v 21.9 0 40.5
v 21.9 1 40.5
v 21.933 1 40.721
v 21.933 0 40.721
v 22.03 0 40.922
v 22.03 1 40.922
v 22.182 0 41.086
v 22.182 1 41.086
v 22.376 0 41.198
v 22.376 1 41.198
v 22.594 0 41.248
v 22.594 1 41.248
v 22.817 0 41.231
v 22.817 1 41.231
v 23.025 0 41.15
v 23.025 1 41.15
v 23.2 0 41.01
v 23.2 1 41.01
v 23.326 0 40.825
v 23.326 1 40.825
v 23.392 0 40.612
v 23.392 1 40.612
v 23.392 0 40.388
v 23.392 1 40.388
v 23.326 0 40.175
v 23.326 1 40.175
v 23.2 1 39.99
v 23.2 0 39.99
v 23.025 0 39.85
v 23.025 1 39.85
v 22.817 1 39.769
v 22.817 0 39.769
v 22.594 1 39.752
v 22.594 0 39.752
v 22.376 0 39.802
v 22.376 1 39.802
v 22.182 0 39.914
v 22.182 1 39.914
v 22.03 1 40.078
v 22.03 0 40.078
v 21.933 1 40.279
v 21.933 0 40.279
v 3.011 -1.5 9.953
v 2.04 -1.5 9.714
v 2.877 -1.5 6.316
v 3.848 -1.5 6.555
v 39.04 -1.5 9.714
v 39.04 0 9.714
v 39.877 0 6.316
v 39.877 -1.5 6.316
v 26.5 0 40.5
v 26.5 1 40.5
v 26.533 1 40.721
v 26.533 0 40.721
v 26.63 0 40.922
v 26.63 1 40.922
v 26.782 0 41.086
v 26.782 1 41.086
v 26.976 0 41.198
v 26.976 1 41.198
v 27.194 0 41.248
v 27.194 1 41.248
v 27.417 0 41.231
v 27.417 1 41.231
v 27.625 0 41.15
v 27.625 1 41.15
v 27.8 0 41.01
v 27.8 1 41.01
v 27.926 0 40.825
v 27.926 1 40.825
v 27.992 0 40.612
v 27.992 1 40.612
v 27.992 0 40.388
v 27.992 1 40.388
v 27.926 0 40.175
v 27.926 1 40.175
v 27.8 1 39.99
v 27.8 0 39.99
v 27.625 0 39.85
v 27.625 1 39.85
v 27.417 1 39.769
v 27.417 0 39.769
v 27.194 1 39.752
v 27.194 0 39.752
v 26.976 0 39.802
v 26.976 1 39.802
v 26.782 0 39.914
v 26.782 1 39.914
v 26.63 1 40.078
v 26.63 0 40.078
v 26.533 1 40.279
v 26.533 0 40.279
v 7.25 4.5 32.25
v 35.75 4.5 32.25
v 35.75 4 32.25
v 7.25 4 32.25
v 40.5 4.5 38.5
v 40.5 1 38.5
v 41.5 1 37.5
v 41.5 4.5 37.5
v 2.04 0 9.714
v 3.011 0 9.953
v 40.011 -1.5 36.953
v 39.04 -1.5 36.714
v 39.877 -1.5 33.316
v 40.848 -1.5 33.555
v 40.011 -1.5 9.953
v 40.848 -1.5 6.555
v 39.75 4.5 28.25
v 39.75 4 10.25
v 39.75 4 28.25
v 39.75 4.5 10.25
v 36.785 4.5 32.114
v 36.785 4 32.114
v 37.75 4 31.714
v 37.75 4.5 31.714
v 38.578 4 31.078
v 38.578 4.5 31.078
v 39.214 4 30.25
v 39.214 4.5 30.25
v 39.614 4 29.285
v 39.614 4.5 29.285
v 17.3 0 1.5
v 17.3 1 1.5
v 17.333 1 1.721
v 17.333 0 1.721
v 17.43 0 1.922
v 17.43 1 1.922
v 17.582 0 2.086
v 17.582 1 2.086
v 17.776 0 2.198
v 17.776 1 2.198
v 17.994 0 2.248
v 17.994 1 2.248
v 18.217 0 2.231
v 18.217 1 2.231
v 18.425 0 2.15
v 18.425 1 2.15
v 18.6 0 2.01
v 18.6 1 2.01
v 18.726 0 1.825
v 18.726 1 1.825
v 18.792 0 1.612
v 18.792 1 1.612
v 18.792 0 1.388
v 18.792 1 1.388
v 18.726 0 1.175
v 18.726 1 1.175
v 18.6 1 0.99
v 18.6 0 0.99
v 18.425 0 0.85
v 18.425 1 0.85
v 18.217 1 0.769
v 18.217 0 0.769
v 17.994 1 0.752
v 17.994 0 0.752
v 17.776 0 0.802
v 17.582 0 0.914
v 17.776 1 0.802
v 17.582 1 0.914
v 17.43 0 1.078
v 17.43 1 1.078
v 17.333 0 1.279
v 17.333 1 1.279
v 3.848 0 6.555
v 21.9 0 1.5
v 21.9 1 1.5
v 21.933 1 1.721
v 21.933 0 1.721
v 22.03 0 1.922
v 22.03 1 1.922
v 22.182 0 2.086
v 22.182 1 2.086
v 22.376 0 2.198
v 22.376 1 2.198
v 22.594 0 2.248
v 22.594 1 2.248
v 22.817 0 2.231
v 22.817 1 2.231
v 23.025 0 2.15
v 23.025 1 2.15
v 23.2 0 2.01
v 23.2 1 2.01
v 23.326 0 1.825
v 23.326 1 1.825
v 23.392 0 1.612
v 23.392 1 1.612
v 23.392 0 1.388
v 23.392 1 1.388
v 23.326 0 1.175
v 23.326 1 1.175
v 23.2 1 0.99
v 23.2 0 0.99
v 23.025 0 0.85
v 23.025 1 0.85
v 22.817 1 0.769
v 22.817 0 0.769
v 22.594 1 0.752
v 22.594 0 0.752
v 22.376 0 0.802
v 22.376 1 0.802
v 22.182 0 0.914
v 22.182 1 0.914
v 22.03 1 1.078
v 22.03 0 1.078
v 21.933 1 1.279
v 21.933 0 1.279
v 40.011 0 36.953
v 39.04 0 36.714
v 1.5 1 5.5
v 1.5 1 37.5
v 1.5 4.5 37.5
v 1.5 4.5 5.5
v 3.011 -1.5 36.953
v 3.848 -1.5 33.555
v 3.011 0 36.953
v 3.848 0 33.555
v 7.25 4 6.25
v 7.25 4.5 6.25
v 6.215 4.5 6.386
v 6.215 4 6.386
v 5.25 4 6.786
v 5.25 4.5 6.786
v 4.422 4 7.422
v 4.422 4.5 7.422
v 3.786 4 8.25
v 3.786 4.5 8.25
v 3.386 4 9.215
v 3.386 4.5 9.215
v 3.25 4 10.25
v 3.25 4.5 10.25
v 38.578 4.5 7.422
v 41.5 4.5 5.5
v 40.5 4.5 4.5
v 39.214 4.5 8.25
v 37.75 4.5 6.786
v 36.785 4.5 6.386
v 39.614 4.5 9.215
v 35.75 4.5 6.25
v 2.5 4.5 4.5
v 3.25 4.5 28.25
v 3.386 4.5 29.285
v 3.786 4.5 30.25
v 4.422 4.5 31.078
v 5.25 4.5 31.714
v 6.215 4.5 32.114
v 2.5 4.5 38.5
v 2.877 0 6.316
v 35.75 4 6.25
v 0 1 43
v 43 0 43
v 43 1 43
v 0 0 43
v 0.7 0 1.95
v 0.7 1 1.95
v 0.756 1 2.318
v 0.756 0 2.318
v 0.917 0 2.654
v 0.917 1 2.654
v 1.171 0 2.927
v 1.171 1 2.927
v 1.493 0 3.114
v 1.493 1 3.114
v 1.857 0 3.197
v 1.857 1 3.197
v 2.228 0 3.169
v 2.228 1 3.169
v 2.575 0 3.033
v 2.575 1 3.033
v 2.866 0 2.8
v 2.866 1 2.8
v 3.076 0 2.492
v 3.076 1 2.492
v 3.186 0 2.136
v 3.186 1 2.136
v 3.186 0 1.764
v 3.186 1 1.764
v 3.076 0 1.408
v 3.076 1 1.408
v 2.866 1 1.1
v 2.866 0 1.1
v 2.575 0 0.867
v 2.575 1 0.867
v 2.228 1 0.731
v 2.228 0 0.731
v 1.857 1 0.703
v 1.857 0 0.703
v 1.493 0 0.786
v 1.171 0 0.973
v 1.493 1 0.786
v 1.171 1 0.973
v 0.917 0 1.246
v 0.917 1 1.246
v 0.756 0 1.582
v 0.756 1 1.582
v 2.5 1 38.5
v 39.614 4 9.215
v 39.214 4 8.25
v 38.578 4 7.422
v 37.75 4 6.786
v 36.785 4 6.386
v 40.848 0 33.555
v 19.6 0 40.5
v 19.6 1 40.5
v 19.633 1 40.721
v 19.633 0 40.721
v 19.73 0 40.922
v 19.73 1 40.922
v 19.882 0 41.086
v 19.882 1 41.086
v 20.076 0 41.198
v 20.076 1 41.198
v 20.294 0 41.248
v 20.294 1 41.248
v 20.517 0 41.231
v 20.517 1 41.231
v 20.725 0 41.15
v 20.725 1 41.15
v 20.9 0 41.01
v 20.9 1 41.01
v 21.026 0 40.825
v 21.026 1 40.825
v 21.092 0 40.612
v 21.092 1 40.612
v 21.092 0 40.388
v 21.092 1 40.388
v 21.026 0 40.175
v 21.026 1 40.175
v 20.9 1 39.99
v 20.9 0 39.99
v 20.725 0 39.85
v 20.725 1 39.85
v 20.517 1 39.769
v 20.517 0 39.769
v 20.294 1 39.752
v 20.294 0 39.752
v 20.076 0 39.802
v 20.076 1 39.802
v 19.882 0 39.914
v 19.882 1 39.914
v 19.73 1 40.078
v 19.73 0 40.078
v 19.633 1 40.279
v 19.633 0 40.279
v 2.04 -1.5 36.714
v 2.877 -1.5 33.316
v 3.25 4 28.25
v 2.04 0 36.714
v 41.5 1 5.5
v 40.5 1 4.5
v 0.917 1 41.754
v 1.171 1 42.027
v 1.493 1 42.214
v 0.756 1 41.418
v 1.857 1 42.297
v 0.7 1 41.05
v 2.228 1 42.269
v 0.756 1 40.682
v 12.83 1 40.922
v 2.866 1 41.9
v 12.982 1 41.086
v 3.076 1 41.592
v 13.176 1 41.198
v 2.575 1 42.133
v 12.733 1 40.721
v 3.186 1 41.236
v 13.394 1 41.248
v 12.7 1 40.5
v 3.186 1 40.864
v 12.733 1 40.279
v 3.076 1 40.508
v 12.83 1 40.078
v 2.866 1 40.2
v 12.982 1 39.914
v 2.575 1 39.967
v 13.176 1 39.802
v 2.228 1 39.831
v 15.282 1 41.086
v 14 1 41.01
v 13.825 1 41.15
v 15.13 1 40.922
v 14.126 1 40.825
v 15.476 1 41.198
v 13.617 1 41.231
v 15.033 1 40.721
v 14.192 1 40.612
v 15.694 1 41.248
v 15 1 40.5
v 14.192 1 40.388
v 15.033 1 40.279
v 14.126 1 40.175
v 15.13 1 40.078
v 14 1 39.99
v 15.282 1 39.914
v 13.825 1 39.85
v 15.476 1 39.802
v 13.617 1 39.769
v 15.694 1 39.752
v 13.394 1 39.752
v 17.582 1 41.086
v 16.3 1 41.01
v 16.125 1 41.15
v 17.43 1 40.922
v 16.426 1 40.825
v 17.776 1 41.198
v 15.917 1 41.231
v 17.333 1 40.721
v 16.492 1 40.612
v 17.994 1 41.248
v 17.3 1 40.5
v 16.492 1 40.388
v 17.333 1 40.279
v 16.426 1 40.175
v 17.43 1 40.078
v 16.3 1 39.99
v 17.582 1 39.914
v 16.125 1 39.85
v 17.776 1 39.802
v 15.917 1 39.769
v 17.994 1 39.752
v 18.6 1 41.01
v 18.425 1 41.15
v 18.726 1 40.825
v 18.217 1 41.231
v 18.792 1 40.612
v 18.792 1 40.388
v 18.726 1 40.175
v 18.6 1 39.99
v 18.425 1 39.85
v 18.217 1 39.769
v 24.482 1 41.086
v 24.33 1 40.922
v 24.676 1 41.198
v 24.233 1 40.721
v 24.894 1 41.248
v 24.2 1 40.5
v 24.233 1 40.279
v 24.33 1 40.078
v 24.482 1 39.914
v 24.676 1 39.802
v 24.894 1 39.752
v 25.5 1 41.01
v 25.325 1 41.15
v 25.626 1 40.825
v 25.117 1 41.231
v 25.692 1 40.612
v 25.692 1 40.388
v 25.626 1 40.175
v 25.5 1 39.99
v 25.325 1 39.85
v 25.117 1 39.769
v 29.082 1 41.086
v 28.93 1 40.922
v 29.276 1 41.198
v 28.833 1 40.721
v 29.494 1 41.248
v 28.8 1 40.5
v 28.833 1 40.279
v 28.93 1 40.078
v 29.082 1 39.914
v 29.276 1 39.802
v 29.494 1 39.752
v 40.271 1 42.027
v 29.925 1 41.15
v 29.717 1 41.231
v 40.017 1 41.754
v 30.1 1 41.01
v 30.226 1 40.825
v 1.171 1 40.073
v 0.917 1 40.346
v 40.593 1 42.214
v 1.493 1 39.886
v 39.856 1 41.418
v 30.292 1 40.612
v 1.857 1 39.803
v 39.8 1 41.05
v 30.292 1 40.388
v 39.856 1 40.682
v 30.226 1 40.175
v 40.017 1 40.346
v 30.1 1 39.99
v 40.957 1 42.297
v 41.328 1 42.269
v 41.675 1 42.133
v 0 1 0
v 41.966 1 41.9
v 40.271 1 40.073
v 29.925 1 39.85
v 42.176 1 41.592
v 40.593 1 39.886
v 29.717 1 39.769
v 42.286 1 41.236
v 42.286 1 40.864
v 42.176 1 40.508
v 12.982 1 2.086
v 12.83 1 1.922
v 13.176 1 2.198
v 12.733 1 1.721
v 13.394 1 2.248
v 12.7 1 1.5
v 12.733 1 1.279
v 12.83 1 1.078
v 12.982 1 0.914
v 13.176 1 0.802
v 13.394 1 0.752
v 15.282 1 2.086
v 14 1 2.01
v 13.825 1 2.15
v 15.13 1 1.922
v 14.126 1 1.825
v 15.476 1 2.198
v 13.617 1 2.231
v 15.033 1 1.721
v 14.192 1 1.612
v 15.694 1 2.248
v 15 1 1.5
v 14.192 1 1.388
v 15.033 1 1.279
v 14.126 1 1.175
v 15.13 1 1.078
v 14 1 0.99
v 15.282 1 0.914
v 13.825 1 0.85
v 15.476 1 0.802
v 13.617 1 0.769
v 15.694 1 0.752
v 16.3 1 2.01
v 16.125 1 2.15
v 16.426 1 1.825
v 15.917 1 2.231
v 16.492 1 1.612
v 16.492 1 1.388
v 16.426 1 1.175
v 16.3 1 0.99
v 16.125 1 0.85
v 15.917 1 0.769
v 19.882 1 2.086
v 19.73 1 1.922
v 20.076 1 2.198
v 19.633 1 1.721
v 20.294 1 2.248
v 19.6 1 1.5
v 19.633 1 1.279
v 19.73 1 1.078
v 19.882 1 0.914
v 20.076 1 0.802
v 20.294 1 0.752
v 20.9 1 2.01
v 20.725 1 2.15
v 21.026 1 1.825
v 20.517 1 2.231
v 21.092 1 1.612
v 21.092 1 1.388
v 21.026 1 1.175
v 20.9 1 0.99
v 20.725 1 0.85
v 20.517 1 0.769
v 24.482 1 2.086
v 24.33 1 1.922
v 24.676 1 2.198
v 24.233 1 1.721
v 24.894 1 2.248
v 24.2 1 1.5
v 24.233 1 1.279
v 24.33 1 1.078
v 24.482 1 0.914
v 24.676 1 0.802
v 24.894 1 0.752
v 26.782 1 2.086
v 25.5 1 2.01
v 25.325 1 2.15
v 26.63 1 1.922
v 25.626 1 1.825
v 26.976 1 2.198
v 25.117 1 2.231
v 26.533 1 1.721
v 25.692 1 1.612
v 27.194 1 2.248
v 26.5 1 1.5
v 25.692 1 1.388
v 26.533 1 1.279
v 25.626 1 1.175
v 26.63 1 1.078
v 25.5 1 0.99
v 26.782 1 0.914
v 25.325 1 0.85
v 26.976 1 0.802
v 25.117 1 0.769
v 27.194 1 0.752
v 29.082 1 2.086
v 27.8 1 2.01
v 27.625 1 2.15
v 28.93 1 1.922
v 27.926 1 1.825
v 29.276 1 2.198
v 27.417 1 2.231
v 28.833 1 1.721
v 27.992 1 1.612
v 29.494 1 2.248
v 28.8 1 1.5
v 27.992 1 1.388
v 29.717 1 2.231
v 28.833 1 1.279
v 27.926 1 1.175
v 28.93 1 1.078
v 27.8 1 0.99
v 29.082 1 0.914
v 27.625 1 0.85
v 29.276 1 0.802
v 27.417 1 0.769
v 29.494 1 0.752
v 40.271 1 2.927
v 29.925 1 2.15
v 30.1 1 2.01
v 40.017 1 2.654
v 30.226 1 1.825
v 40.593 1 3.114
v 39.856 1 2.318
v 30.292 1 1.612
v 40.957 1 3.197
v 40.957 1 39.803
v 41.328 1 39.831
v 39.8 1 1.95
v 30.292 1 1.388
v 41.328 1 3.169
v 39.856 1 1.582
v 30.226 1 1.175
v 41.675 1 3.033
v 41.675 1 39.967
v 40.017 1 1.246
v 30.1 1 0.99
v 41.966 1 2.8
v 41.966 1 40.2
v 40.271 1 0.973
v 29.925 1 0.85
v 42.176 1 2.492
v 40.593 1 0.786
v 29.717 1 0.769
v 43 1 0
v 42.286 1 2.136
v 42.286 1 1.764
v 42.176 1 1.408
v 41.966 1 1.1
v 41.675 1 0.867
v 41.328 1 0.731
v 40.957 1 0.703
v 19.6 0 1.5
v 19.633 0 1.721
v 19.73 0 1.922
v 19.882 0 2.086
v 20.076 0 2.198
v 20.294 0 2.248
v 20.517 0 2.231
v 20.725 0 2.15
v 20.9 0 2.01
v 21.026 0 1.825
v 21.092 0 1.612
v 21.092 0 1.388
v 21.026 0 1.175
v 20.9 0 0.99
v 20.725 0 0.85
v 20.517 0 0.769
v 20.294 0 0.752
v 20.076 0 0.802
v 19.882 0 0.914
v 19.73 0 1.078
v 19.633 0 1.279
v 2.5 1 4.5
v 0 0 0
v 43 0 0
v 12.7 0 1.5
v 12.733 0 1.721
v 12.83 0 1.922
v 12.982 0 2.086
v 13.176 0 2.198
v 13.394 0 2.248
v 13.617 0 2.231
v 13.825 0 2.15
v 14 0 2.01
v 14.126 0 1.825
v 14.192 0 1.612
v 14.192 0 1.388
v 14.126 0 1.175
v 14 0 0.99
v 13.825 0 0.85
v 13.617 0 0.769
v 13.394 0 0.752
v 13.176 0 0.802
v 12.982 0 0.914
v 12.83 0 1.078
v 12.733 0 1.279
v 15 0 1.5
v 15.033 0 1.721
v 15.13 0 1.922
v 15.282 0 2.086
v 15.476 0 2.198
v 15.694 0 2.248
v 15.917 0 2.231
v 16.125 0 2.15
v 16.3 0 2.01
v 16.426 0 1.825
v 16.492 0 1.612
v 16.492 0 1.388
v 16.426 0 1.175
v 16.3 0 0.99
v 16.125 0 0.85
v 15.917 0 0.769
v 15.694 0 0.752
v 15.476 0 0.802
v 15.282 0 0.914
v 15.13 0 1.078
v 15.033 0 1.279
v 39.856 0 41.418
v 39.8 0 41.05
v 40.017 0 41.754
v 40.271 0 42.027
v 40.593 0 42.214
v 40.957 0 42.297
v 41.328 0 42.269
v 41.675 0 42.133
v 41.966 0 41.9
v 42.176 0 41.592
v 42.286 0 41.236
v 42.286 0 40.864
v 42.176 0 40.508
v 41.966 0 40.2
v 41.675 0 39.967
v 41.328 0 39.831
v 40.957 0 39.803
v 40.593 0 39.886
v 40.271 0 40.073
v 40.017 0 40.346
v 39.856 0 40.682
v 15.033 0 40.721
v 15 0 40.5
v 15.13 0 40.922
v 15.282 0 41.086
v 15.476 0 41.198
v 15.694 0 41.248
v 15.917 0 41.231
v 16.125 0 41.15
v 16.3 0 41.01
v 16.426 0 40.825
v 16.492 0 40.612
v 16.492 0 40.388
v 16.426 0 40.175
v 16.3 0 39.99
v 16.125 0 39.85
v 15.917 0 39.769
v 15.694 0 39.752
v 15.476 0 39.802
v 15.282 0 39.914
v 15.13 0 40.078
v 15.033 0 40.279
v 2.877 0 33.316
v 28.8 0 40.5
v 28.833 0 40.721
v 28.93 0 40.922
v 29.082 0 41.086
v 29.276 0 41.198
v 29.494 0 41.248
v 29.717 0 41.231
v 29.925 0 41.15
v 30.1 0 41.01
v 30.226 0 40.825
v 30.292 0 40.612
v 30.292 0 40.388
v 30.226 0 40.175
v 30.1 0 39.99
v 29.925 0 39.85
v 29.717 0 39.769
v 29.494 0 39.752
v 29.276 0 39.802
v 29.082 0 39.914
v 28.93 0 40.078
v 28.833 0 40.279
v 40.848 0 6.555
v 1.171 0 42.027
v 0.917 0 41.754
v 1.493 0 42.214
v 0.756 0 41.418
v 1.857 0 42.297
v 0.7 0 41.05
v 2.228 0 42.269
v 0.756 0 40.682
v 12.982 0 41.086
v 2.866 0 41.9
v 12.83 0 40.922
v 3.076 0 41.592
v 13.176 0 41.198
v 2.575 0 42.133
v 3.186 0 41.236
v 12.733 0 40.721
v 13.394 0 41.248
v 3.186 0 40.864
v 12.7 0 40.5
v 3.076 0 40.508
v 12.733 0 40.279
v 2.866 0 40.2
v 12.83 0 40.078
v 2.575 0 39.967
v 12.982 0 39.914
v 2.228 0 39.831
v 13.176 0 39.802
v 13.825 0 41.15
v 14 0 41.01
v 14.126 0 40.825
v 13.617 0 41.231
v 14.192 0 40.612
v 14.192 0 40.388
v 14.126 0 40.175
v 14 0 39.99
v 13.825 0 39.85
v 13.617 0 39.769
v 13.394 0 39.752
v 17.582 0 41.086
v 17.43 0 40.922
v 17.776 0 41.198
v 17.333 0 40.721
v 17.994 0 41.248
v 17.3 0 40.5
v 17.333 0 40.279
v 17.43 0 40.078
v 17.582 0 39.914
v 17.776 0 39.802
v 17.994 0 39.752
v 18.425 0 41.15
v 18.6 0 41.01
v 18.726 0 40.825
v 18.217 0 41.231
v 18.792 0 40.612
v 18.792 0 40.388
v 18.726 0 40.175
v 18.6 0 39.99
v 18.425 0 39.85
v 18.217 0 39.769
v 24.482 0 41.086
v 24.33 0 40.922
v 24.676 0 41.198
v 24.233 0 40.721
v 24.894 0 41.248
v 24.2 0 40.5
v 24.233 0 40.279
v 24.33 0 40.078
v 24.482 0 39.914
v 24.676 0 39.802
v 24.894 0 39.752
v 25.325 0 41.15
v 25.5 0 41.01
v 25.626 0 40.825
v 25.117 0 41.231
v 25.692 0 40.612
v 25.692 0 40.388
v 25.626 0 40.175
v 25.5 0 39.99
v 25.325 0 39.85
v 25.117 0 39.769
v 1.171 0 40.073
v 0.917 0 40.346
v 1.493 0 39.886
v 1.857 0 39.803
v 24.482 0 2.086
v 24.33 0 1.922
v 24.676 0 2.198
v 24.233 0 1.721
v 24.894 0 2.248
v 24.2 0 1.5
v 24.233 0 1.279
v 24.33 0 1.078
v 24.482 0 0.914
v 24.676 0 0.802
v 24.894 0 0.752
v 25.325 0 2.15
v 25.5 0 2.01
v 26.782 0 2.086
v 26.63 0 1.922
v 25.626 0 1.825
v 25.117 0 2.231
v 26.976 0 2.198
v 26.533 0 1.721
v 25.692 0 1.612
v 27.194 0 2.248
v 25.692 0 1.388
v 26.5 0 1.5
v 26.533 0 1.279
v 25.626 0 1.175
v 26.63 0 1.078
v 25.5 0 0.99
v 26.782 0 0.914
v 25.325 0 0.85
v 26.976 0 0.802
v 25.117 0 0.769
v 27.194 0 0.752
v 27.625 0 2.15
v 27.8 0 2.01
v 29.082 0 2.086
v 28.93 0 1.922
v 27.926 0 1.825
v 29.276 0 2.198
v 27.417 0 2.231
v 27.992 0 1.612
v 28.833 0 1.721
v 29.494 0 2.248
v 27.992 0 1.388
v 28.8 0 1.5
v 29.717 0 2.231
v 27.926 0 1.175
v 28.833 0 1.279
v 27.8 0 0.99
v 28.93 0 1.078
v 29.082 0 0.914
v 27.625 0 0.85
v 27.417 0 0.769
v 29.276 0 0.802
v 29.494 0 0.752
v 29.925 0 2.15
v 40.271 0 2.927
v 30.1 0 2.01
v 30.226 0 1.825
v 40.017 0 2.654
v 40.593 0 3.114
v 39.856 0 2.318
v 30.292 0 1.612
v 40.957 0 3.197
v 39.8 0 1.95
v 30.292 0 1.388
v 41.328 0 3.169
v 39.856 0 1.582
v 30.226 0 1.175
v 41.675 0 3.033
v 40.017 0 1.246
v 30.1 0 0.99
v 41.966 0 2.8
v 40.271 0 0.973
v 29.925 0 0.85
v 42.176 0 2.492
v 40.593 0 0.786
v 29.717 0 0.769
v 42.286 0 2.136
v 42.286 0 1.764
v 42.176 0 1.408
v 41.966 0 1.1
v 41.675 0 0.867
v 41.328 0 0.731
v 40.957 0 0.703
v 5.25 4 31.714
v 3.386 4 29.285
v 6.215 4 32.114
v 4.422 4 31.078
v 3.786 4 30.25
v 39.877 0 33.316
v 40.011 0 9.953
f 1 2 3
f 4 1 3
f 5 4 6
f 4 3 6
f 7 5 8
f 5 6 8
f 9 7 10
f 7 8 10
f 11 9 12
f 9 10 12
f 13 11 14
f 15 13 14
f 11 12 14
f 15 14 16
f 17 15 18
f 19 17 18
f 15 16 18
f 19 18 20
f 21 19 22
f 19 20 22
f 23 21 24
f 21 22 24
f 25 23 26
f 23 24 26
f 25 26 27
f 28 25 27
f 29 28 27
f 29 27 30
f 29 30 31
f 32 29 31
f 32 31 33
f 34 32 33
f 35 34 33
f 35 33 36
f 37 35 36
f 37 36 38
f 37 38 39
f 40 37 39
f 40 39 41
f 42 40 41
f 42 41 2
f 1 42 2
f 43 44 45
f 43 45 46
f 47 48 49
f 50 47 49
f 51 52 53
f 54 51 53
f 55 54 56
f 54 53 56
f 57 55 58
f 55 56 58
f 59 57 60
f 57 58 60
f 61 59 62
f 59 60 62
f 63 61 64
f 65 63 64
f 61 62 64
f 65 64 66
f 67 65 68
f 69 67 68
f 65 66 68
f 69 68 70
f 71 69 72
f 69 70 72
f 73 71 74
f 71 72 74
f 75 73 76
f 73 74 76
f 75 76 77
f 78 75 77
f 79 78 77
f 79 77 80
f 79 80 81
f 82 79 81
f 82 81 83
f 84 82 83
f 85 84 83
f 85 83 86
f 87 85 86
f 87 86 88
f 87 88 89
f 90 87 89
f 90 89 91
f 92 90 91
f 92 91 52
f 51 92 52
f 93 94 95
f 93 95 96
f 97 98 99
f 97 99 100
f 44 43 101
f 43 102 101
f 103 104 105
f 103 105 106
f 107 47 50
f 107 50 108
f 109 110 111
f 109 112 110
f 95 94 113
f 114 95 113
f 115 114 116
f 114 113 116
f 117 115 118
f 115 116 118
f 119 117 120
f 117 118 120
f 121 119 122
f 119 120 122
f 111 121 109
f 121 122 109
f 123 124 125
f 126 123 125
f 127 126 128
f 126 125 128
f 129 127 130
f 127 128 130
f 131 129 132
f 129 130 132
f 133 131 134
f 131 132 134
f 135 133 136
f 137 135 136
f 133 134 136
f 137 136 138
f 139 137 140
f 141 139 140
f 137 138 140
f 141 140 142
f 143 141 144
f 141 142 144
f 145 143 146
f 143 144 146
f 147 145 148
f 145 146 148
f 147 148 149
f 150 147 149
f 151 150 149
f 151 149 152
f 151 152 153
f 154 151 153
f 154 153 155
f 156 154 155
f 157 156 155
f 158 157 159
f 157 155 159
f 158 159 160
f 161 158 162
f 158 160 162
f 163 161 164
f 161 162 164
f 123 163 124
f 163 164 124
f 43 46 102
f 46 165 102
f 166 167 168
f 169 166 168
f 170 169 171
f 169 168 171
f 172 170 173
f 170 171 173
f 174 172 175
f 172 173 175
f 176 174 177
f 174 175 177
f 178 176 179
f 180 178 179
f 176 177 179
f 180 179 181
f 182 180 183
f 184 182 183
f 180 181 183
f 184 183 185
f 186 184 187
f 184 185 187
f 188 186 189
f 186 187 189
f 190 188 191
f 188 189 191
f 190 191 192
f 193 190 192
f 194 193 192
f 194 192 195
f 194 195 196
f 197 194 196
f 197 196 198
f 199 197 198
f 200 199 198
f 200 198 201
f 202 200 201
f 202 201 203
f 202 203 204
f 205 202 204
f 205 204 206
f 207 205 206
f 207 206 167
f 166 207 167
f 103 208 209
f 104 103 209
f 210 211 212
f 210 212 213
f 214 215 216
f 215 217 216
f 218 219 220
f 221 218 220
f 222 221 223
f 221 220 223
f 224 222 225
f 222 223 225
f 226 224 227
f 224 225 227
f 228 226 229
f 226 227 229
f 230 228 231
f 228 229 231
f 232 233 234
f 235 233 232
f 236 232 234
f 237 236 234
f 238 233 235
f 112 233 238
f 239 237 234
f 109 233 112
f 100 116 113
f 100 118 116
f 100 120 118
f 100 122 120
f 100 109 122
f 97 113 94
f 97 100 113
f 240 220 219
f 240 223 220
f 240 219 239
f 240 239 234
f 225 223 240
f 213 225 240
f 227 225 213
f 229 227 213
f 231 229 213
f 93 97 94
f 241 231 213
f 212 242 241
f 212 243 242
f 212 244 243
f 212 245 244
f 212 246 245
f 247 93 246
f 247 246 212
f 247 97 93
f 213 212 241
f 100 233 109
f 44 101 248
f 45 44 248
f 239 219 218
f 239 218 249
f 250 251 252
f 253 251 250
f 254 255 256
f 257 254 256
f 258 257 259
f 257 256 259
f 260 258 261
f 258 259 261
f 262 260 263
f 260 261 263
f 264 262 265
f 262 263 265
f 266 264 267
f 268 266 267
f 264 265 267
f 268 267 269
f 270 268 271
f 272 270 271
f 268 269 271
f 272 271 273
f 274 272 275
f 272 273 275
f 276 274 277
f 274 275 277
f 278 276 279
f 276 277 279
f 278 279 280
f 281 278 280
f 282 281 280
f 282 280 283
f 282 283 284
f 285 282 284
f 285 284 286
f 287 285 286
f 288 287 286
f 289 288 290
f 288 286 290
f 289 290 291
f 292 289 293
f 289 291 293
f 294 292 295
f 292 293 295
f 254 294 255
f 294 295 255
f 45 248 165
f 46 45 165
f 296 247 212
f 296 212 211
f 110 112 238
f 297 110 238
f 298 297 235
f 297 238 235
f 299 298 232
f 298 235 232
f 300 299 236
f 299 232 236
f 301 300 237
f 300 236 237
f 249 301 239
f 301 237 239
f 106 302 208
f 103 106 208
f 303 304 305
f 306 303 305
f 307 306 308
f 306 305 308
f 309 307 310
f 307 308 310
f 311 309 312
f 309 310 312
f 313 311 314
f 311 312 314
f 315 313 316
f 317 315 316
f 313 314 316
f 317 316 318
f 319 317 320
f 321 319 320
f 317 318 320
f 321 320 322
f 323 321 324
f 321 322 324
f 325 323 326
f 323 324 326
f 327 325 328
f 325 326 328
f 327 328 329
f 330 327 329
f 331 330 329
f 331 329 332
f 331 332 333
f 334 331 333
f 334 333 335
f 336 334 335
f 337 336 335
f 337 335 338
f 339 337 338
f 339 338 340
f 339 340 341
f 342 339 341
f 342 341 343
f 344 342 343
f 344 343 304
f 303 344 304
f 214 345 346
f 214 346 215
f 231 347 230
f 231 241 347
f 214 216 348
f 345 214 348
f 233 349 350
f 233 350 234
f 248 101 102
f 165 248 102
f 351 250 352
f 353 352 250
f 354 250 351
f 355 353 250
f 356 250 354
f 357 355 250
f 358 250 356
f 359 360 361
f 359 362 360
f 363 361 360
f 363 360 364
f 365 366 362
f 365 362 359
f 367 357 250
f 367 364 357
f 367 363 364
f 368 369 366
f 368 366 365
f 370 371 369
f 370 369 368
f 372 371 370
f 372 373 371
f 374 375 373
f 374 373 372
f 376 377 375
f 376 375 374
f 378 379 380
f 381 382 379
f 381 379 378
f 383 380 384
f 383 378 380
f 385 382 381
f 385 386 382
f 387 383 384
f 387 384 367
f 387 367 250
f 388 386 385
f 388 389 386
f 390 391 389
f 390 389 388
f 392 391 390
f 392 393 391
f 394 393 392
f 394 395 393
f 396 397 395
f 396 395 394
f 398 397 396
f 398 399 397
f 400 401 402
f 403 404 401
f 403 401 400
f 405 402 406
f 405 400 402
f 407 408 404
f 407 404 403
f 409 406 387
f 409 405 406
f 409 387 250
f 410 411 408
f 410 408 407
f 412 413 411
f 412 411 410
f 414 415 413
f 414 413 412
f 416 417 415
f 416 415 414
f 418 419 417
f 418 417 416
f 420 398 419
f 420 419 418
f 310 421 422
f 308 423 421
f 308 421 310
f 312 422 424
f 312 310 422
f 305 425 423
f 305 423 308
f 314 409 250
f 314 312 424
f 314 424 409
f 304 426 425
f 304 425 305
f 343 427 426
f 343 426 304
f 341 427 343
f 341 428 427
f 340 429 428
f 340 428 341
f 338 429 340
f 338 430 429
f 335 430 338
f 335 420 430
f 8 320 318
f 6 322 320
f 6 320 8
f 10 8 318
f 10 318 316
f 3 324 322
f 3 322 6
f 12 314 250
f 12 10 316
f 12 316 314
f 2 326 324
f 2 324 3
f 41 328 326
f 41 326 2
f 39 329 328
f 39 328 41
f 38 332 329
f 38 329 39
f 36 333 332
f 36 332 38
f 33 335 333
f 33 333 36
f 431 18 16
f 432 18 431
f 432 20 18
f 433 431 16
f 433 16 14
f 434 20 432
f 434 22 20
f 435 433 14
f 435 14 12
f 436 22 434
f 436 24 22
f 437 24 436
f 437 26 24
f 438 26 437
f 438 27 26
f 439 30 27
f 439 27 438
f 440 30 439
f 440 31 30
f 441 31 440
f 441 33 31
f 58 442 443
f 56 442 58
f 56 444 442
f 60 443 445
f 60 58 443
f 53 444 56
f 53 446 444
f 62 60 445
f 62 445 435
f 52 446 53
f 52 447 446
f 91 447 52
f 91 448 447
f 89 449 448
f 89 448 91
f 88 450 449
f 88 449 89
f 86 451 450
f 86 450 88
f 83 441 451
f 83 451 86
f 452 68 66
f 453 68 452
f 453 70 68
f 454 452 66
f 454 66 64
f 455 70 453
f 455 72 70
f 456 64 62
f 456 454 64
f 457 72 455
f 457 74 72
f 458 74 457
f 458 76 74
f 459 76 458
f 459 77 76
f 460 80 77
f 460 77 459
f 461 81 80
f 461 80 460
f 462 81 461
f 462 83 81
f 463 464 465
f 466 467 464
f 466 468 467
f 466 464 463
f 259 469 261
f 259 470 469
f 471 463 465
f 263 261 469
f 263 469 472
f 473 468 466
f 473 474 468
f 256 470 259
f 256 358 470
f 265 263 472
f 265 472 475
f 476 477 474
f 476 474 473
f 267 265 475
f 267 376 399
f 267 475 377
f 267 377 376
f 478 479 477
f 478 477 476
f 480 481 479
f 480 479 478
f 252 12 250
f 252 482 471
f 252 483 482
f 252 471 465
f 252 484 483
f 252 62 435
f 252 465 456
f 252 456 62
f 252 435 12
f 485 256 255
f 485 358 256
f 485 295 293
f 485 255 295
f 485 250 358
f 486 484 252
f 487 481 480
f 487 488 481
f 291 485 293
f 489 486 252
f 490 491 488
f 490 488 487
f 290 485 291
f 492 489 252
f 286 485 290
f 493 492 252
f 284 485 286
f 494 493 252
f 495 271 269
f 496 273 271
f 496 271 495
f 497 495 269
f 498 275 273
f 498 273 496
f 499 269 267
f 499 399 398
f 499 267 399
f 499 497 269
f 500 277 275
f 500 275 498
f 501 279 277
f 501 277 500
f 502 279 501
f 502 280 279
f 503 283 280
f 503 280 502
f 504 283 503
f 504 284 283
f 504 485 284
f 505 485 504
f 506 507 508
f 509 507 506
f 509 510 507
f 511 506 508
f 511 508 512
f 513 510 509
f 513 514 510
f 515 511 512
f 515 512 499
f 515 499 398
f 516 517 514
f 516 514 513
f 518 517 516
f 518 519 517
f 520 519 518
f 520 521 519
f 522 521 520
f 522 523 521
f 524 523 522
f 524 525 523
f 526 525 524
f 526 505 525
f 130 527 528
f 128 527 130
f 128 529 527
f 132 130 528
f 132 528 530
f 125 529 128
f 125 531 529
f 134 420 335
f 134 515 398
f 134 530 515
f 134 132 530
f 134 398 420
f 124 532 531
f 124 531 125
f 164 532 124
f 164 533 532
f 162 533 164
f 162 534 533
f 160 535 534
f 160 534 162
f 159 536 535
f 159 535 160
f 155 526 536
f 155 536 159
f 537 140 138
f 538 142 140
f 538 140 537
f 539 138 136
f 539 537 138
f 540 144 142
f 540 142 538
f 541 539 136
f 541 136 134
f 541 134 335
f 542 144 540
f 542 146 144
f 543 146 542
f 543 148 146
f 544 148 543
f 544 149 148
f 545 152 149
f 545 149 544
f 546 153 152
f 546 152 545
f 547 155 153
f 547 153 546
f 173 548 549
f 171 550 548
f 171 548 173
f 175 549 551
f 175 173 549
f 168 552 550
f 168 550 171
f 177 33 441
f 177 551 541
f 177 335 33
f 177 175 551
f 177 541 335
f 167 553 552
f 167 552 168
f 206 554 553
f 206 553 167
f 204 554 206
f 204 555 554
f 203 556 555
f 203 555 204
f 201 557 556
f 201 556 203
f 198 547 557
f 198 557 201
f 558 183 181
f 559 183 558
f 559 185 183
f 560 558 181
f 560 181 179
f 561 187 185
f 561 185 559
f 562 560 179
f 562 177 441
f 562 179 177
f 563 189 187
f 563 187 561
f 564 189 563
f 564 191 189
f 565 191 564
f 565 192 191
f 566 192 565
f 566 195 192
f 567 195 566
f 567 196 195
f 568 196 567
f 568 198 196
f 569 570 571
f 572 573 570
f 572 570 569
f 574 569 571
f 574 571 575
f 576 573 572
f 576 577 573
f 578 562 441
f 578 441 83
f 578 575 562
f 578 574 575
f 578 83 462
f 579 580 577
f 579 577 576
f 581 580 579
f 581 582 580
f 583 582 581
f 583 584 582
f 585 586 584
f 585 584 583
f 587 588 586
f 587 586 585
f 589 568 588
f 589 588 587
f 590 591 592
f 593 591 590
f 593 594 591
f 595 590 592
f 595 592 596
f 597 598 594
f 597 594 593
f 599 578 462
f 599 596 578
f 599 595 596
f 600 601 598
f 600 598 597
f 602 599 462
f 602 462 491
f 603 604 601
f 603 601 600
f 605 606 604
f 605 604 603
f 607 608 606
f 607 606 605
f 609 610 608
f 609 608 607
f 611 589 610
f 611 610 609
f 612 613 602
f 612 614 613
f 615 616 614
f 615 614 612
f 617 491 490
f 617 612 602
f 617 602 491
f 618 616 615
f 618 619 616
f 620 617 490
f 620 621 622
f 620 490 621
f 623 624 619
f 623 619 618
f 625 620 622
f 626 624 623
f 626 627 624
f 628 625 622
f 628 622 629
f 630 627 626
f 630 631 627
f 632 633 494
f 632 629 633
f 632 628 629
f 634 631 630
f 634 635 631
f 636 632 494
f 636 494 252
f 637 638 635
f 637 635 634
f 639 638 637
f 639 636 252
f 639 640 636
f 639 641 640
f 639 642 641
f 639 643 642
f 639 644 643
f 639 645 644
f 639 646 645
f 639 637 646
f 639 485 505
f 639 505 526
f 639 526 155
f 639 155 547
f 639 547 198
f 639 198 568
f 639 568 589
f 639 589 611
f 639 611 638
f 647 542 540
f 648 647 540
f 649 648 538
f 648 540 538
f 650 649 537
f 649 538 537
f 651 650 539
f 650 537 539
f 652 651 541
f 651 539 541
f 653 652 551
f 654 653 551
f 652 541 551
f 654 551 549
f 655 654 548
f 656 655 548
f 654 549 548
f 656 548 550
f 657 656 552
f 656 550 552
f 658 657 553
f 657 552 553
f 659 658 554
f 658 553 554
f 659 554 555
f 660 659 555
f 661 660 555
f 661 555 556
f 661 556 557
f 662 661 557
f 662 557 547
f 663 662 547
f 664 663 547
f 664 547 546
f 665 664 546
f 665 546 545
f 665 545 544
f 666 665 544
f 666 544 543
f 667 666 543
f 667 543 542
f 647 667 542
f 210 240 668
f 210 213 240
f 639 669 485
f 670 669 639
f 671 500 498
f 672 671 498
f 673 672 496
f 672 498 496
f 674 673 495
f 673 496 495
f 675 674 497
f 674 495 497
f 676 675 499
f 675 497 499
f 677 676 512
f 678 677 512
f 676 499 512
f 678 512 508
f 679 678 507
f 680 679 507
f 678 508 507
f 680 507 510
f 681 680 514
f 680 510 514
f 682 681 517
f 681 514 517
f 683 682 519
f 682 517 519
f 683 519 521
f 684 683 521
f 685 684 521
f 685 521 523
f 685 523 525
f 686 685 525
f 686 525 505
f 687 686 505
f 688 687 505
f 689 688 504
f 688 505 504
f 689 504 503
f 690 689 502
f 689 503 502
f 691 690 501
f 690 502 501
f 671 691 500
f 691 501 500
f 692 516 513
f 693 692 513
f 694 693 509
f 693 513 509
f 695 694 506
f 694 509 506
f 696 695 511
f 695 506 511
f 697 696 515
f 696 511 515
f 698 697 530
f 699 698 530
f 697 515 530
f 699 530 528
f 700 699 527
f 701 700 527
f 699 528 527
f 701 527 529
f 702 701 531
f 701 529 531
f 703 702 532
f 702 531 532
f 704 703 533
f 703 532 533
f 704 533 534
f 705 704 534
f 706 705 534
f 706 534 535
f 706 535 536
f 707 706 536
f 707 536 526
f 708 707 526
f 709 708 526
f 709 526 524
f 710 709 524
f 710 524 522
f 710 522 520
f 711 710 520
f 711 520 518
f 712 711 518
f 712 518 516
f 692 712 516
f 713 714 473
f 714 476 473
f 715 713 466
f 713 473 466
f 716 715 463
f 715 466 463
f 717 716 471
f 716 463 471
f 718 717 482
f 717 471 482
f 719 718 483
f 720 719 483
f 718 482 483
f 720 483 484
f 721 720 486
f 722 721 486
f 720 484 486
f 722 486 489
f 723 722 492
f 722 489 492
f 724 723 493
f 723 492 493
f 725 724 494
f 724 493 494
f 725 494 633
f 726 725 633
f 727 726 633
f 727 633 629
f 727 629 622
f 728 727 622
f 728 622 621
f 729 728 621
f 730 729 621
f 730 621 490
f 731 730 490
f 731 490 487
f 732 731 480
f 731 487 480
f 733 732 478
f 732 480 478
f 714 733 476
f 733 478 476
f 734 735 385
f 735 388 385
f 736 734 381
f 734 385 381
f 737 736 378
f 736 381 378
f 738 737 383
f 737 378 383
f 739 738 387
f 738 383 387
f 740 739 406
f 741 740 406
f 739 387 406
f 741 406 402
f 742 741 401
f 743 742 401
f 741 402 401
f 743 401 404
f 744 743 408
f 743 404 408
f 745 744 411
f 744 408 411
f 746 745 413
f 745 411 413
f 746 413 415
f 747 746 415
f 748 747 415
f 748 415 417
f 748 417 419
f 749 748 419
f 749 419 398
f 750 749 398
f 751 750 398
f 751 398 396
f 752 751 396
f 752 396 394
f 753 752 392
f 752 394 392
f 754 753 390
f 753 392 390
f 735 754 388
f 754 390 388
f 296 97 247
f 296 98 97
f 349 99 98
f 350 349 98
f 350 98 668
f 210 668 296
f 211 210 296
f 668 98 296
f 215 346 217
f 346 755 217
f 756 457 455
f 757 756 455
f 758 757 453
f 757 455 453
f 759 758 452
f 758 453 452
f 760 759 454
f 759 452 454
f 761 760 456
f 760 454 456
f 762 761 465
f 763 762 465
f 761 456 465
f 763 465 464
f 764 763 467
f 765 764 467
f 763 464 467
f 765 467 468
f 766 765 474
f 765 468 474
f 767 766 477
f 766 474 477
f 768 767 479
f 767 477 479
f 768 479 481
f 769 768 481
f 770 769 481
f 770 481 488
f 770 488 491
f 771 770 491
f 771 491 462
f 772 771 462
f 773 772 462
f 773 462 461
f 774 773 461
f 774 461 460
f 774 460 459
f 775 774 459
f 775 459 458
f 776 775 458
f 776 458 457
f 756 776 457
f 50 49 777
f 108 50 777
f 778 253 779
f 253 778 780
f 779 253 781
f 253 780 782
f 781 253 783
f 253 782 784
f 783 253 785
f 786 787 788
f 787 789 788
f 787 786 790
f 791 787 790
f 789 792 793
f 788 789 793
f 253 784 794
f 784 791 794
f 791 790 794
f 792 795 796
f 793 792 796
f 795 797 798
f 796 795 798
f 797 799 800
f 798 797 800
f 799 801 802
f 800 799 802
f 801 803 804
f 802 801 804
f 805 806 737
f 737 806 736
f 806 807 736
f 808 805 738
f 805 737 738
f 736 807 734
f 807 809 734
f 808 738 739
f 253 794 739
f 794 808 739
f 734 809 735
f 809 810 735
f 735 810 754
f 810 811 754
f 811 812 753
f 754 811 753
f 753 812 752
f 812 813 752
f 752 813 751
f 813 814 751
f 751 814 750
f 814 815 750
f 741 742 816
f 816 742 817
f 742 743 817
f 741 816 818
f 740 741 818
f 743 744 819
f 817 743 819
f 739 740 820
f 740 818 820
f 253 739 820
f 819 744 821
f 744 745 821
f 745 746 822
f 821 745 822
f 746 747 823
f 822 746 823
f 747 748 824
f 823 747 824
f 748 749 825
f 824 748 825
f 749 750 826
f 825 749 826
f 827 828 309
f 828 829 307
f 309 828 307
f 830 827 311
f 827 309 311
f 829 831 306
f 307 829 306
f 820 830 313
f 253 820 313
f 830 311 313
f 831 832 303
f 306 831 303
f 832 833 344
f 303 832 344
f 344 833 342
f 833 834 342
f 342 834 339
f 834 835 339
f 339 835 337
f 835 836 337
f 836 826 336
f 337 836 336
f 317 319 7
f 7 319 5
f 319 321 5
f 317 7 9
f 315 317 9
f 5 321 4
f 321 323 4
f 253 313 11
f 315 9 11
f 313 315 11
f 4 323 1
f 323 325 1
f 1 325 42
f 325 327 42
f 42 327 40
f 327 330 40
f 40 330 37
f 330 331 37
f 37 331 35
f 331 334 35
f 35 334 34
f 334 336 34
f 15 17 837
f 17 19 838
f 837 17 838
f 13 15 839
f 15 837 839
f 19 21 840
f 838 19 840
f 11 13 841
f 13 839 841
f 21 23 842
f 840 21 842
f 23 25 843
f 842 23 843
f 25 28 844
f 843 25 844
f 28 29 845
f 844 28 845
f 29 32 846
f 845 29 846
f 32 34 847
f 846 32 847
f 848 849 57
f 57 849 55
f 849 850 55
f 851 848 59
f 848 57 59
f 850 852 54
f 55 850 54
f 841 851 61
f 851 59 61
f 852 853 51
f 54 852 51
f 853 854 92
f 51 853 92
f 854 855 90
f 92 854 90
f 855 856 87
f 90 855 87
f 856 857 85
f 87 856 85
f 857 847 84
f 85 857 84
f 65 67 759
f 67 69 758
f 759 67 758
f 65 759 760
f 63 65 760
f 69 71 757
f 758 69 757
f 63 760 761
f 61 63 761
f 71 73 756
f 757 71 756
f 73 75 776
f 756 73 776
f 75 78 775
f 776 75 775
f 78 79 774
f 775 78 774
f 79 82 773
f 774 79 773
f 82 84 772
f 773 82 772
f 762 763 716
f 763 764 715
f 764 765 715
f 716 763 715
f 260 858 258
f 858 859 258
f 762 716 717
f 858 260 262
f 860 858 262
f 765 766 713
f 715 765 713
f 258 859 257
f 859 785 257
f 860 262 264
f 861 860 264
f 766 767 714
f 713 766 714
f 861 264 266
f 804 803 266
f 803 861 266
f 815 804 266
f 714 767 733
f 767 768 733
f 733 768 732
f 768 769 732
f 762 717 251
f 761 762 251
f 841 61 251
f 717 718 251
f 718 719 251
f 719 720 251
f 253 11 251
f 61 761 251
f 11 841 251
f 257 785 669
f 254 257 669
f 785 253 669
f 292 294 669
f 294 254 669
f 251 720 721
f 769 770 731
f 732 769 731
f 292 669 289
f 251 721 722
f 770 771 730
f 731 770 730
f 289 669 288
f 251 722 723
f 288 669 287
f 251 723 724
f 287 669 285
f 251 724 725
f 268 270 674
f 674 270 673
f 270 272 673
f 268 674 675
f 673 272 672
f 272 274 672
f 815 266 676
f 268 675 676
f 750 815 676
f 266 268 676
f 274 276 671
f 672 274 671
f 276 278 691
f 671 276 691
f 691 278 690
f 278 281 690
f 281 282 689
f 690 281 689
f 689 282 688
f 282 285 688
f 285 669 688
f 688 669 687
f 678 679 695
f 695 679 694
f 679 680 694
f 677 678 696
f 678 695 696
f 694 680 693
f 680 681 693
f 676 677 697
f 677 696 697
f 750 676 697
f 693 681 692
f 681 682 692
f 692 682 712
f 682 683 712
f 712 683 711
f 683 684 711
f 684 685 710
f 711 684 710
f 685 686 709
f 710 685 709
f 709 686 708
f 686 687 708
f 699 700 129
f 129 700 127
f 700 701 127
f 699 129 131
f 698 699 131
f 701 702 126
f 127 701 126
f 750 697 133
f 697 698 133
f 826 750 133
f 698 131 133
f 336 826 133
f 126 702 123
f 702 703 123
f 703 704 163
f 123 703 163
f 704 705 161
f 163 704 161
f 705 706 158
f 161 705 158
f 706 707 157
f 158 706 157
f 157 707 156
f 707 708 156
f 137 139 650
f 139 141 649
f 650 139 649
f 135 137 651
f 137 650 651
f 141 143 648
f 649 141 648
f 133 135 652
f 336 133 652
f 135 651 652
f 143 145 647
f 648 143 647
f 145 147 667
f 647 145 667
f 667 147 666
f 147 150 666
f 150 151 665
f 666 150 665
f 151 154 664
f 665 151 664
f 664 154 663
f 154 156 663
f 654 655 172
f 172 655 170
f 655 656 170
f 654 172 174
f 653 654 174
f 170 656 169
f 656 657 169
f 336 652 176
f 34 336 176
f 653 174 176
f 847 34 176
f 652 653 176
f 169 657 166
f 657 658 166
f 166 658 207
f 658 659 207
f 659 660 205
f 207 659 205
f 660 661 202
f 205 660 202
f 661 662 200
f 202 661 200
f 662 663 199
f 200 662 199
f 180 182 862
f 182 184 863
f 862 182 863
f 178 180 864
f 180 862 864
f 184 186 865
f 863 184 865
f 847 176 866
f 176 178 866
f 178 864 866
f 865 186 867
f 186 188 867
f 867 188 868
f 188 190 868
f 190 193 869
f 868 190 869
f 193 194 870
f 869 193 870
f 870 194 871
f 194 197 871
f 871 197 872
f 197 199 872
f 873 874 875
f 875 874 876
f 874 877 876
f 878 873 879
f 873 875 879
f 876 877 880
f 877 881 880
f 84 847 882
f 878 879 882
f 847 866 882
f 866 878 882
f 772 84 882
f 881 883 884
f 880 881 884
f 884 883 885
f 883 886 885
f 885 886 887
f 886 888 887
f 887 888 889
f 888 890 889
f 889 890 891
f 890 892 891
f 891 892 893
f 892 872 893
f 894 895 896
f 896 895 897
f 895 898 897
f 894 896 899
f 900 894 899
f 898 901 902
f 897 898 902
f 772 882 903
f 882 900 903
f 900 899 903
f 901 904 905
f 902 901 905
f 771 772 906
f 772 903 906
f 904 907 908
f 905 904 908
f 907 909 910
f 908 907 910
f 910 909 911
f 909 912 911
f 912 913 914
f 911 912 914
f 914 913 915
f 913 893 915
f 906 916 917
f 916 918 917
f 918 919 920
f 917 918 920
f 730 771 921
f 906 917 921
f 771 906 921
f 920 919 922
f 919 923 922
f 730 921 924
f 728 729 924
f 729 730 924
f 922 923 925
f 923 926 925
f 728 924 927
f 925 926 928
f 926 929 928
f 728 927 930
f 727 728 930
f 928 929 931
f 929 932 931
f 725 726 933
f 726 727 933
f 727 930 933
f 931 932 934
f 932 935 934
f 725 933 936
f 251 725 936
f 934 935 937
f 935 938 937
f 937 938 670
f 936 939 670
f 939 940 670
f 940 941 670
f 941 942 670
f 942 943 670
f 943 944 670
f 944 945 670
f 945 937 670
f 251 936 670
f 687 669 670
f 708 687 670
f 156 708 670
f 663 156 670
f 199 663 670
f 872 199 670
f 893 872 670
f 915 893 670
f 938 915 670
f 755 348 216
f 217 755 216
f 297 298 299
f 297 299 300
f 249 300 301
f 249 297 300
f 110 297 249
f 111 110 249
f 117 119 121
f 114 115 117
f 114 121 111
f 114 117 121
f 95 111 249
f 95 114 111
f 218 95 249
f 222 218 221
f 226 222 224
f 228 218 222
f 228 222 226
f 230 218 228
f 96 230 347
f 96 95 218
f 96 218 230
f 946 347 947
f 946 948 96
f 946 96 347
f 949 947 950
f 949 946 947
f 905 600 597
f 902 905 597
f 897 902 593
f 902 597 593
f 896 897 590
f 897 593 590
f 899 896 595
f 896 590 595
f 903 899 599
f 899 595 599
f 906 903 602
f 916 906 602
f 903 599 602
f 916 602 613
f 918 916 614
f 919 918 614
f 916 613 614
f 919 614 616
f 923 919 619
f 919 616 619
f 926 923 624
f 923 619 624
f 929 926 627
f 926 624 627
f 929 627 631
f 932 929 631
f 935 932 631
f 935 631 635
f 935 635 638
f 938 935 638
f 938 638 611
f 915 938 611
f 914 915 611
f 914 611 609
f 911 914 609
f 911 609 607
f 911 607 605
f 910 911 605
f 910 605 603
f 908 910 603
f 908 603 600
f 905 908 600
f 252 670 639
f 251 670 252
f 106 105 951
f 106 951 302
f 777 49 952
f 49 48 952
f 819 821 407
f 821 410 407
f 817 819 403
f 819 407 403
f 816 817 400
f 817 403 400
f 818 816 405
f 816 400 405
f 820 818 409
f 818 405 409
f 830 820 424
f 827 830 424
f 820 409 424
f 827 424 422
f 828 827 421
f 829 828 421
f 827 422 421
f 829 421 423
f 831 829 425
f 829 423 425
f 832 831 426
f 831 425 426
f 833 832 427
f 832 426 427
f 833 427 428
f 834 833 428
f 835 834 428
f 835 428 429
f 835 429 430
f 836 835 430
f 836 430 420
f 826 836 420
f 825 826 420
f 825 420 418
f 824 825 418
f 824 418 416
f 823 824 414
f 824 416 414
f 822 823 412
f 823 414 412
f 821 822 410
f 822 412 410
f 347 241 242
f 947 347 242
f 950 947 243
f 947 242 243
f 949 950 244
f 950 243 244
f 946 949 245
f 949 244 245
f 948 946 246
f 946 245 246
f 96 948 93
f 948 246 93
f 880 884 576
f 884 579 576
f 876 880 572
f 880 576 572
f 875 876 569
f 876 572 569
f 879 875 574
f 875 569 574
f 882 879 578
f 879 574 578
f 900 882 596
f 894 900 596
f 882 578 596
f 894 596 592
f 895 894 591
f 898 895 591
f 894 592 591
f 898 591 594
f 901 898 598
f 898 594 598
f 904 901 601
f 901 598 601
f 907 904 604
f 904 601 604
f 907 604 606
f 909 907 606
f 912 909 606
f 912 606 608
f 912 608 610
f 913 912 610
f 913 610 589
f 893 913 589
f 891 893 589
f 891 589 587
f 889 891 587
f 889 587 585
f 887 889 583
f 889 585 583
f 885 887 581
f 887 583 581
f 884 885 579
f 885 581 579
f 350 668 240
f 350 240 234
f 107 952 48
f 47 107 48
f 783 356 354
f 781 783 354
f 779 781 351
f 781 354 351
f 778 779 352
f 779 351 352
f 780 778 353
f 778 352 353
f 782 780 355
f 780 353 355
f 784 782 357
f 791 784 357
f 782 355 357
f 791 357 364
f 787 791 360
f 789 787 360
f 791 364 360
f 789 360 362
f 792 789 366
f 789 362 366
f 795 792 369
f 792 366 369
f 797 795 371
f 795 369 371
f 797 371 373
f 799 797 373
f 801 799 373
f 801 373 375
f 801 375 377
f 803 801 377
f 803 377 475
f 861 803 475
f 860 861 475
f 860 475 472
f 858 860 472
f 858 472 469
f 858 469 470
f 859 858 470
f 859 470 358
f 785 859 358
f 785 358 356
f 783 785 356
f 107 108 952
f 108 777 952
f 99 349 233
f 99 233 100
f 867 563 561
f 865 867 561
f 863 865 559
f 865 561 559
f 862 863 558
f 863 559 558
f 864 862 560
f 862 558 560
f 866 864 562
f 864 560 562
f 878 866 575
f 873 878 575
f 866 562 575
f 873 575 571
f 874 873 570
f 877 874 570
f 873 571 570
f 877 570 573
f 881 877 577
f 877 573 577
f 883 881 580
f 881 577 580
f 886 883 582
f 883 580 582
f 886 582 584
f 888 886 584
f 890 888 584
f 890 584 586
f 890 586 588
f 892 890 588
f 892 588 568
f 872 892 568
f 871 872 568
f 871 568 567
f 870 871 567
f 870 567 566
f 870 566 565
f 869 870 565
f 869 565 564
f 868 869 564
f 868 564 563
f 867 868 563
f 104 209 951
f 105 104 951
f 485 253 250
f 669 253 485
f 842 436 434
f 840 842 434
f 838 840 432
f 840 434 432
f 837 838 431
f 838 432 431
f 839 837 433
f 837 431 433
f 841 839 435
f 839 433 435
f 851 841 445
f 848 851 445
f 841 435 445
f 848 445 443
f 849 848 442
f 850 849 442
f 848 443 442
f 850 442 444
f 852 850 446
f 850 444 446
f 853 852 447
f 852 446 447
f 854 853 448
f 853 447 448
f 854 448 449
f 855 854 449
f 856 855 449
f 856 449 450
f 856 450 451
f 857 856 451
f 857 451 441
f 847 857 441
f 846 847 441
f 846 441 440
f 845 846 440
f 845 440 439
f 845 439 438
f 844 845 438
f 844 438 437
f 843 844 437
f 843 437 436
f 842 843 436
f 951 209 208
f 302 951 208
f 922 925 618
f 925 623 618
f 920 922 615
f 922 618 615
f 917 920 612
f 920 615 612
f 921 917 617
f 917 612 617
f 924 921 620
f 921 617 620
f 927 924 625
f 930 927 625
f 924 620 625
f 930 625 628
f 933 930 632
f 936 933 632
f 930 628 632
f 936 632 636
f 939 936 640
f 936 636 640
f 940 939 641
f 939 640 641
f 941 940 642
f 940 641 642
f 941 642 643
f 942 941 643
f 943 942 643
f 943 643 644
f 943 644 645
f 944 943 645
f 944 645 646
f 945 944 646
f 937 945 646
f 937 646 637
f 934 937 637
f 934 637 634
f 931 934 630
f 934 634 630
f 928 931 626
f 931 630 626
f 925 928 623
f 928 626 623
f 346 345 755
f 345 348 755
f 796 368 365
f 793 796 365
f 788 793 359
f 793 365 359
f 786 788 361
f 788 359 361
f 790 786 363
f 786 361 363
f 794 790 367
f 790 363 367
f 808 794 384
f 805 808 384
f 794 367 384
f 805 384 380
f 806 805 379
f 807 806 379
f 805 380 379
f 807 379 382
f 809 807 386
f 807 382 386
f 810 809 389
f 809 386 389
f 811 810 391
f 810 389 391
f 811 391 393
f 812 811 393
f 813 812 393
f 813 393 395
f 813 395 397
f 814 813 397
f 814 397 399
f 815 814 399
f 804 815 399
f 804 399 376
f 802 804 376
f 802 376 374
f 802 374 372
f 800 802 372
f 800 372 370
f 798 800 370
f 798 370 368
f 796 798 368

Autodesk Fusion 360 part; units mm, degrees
sketch "Sketch1" plane through (0, 0, 0) normal (0, 1, 0) x (1, 0, 0)
  line L0 (0, 0) -> (43, 0)
  line L1 (43, 0) -> (43, -43)
  line L2 (43, -43) -> (0, -43)
  line L3 (0, -43) -> (0, 0)
  dimension "d1" = 43
  dimension "d2" = 43
extrude "Extrude1" add sketch "Sketch1" along normal blind 1 makes body 1
copy_body "Body->Comp1" bodies 1 removing the originals makes body 2 in component "pcb"
sketch "Sketch1 (2)" plane through (0, 1, 0) normal (0, 1, 0) x (-1, 0, 0) in component "Component"
  line L0 (0, 43) -> (-43, 43)
  line L1 (-43, 43) -> (-43, 0)
  line L2 (-43, 0) -> (0, 0)
  line L3 (0, 0) -> (0, 43)
  line L4 (-1.5, 4.5) -> (-41.5, 4.5)
  line L5 (-41.5, 4.5) -> (-41.5, 38.5)
  line L6 (-41.5, 38.5) -> (-1.5, 38.5)
  line L7 (-1.5, 38.5) -> (-1.5, 4.5)
  dimension "d5" = 40
  dimension "d6" = 34
  dimension "d7" = 1.5
  dimension "d8" = 4.5
extrude "Extrude1'" add sketch "Sketch1 (2)" along normal blind 3.5 separate body contours L4 L5 L6 L7 makes body 3 in component "Component"
sketch "Sketch2" plane through (0, 4.5, 0) normal (0, 1, 0) x (-1, 0, 0) in component "Component"
  line L0 (-1.5, 38.5) -> (-41.5, 38.5)
  line L1 (-41.5, 38.5) -> (-41.5, 4.5)
  line L2 (-41.5, 4.5) -> (-1.5, 4.5)
  line L3 (-1.5, 4.5) -> (-1.5, 38.5)
  line L4 (-7.25, 6.25) -> (-35.75, 6.25)
  line L5 (-39.75, 10.25) -> (-39.75, 28.25)
  line L6 (-35.75, 32.25) -> (-7.25, 32.25)
  line L7 (-3.25, 28.25) -> (-3.25, 10.25)
  arc A0 (-7.25, 6.25) -> (-3.25, 10.25) centre (-7.25, 10.25) ccw
  arc A1 (-39.75, 10.25) -> (-35.75, 6.25) centre (-35.75, 10.25) ccw
  arc A2 (-35.75, 32.25) -> (-39.75, 28.25) centre (-35.75, 28.25) ccw
  arc A3 (-3.25, 28.25) -> (-7.25, 32.25) centre (-7.25, 28.25) ccw
  point P0 (-3.25, 6.25)
  point P1 (-39.75, 6.25)
  point P2 (-3.25, 32.25)
  dimension "d11" = 36.5
  dimension "d12" = 26
  dimension "d13" = 1.75
  dimension "d14" = 1.75
  dimension "d15" = 4
extrude "Extrude2" cut sketch "Sketch2" against normal blind 0.5 contours L4 L5 L6 L7 A0 A1 A2 A3 bodies 3 in component "Component"
sketch "Sketch1 (3)" plane through (0, 1, 0) normal (0, 1, 0) x (-1, 0, 0) in component "pcb"
  line L0 (0, 43) -> (-43, 43)
  line L1 (-43, 43) -> (-43, 0)
  line L2 (-43, 0) -> (0, 0)
  line L3 (0, 0) -> (0, 43)
  circle A0 centre (-1.95, 1.95) radius 1.25
  circle A1 centre (-1.95, 41.05) radius 1.25
  circle A2 centre (-41.05, 41.05) radius 1.25
  circle A3 centre (-41.05, 1.95) radius 1.25
  point P0 (-21.5, 21.5)
  dimension "d18" = 2.5
  dimension "d19" = 1.95
  dimension "d20" = 1.95
  dimension "d22" = 360
extrude "Extrude1''" cut sketch "Sketch1 (3)" against normal up to surface (1 mm away) contours A0 | A1 | A2 | A3 bodies 2 in component "pcb"
sketch "Sketch2 (2)" plane through (0, 1, 0) normal (0, 1, 0) x (-1, 0, 0) in component "pcb"
  circle A0 centre (-41.05, 1.95) radius 1.25
  circle A1 centre (-41.05, 41.05) radius 1.25
  circle A2 centre (-1.95, 1.95) radius 1.25
  circle A3 centre (-1.95, 41.05) radius 1.25
  line L0 (0, 43) -> (-43, 43)
  line L1 (-43, 43) -> (-43, 0)
  line L2 (-43, 0) -> (0, 0)
  line L3 (0, 0) -> (0, 43)
  circle A4 centre (-13.45, 1.5) radius 0.75
  circle A5 centre (-15.75, 1.5) radius 0.75
  circle A6 centre (-18.05, 1.5) radius 0.75
  circle A7 centre (-20.35, 1.5) radius 0.75
  circle A8 centre (-22.65, 1.5) radius 0.75
  circle A9 centre (-24.95, 1.5) radius 0.75
  circle A10 centre (-27.25, 1.5) radius 0.75
  circle A11 centre (-29.55, 1.5) radius 0.75
  circle A12 centre (-13.45, 40.5) radius 0.75
  circle A13 centre (-15.75, 40.5) radius 0.75
  circle A14 centre (-18.05, 40.5) radius 0.75
  circle A15 centre (-20.35, 40.5) radius 0.75
  circle A16 centre (-22.65, 40.5) radius 0.75
  circle A17 centre (-24.95, 40.5) radius 0.75
  circle A18 centre (-27.25, 40.5) radius 0.75
  circle A19 centre (-29.55, 40.5) radius 0.75
  dimension "d25" = 1.5
  dimension "d26" = 1.5
  dimension "d29" = -2.3
  dimension "d30" = 39
  dimension "d31" = 13.45
extrude "Extrude2'" cut sketch "Sketch2 (2)" against normal through all contours A4 | A5 | A6 | A7 | A8 | A9 | A10 | A11 | A12 | A13 | A14 | A15 | A16 | A17 | A18 | A19 bodies 2 in component "pcb"
chamfer "Chamfer1" distance 1 angle 45 4 edges at (1.5, 2.75, 38.5) (1.5, 2.75, 4.5) (41.5, 2.75, 4.5) (41.5, 2.75, 38.5) on bodies 3 in component "Component"
sketch "Sketch3" plane through (0, 0, 0) normal (0, -1, 0) x (1, 0, 0) in component "Component"
  circle A0 centre (13.45, 40.5) radius 0.75
  circle A1 centre (22.65, 40.5) radius 0.75
  circle A2 centre (15.75, 1.5) radius 0.75
  circle A3 centre (27.25, 1.5) radius 0.75
  circle A4 centre (29.55, 1.5) radius 0.75
  circle A5 centre (18.05, 1.5) radius 0.75
  circle A6 centre (15.75, 40.5) radius 0.75
  circle A7 centre (20.35, 40.5) radius 0.75
  circle A8 centre (29.55, 40.5) radius 0.75
  circle A9 centre (24.95, 40.5) radius 0.75
  circle A10 centre (22.65, 1.5) radius 0.75
  circle A11 centre (24.95, 1.5) radius 0.75
  circle A12 centre (13.45, 1.5) radius 0.75
  circle A13 centre (20.35, 1.5) radius 0.75
  circle A14 centre (27.25, 40.5) radius 0.75
  circle A15 centre (18.05, 40.5) radius 0.75
  circle A16 centre (41.05, 1.95) radius 1.25
  circle A17 centre (41.05, 41.05) radius 1.25
  circle A18 centre (1.95, 1.95) radius 1.25
  circle A19 centre (1.95, 41.05) radius 1.25
  line L0 (43, 43) -> (0, 43)
  line L1 (0, 43) -> (0, 0)
  line L2 (0, 0) -> (43, 0)
  line L3 (43, 0) -> (43, 43)
  line L4 (39.8773, 6.3156) -> (40.8483, 6.5548)
  line L5 (40.8483, 6.5548) -> (40.0111, 9.9532)
  line L6 (40.0111, 9.9532) -> (39.0401, 9.714)
  line L7 (39.0401, 9.714) -> (39.8773, 6.3156)
  line L8 (3.8483, 6.5548) -> (3.0111, 9.9532)
  line L9 (2.0401, 9.714) -> (2.8773, 6.3156)
  line L10 (3.0111, 9.9532) -> (2.0401, 9.714)
  line L11 (2.8773, 6.3156) -> (3.8483, 6.5548)
  line L12 (40.8483, 33.5548) -> (40.0111, 36.9532)
  line L13 (39.0401, 36.714) -> (39.8773, 33.3156)
  line L14 (40.0111, 36.9532) -> (39.0401, 36.714)
  line L15 (39.8773, 33.3156) -> (40.8483, 33.5548)
  line L16 (3.8483, 33.5548) -> (3.0111, 36.9532)
  line L17 (2.0401, 36.714) -> (2.8773, 33.3156)
  line L18 (3.0111, 36.9532) -> (2.0401, 36.714)
  line L19 (2.8773, 33.3156) -> (3.8483, 33.5548)
  dimension "d34" = 3.5
  dimension "d35" = 1
  dimension "d38" = -37
  dimension "d39" = 27
extrude "Extrude3" add sketch "Sketch3" along normal blind 1.5 separate body contours L4 L5 L6 L7 | L8 L9 L10 L11 | L12 L13 L14 L15 | L16 L17 L18 L19 makes body 4 at (39.3192, -0.5, 35.5812) makes body 5 at (2.5982, -1, 7.4484) makes body 6 at (2.3192, -0.5, 35.5812) makes body 7 at (39.3192, -0.5, 8.5812) in component "Component"
component "pcb" placed x (1, 0, 0) y (0, 1, 0) z (0, 0, 1) at (0, 0, 0)
component "Component" placed x (1, 0, 0) y (0, 1, 0) z (0, 0, 1) at (0, 0, 0) in component "pcb"
equation "d7 = ( ( 43 - 40 ) / 2 ) * 1 mm"
equation "d8 = ( ( 43 - 34 ) / 2 ) * 1 mm"
equation "d13 = ( 40 mm - d11 ) / 2"
equation "d14 = d13"
equation "d19 = ( ( 2.5 / 2 ) + 0.7 ) * 1 mm"
